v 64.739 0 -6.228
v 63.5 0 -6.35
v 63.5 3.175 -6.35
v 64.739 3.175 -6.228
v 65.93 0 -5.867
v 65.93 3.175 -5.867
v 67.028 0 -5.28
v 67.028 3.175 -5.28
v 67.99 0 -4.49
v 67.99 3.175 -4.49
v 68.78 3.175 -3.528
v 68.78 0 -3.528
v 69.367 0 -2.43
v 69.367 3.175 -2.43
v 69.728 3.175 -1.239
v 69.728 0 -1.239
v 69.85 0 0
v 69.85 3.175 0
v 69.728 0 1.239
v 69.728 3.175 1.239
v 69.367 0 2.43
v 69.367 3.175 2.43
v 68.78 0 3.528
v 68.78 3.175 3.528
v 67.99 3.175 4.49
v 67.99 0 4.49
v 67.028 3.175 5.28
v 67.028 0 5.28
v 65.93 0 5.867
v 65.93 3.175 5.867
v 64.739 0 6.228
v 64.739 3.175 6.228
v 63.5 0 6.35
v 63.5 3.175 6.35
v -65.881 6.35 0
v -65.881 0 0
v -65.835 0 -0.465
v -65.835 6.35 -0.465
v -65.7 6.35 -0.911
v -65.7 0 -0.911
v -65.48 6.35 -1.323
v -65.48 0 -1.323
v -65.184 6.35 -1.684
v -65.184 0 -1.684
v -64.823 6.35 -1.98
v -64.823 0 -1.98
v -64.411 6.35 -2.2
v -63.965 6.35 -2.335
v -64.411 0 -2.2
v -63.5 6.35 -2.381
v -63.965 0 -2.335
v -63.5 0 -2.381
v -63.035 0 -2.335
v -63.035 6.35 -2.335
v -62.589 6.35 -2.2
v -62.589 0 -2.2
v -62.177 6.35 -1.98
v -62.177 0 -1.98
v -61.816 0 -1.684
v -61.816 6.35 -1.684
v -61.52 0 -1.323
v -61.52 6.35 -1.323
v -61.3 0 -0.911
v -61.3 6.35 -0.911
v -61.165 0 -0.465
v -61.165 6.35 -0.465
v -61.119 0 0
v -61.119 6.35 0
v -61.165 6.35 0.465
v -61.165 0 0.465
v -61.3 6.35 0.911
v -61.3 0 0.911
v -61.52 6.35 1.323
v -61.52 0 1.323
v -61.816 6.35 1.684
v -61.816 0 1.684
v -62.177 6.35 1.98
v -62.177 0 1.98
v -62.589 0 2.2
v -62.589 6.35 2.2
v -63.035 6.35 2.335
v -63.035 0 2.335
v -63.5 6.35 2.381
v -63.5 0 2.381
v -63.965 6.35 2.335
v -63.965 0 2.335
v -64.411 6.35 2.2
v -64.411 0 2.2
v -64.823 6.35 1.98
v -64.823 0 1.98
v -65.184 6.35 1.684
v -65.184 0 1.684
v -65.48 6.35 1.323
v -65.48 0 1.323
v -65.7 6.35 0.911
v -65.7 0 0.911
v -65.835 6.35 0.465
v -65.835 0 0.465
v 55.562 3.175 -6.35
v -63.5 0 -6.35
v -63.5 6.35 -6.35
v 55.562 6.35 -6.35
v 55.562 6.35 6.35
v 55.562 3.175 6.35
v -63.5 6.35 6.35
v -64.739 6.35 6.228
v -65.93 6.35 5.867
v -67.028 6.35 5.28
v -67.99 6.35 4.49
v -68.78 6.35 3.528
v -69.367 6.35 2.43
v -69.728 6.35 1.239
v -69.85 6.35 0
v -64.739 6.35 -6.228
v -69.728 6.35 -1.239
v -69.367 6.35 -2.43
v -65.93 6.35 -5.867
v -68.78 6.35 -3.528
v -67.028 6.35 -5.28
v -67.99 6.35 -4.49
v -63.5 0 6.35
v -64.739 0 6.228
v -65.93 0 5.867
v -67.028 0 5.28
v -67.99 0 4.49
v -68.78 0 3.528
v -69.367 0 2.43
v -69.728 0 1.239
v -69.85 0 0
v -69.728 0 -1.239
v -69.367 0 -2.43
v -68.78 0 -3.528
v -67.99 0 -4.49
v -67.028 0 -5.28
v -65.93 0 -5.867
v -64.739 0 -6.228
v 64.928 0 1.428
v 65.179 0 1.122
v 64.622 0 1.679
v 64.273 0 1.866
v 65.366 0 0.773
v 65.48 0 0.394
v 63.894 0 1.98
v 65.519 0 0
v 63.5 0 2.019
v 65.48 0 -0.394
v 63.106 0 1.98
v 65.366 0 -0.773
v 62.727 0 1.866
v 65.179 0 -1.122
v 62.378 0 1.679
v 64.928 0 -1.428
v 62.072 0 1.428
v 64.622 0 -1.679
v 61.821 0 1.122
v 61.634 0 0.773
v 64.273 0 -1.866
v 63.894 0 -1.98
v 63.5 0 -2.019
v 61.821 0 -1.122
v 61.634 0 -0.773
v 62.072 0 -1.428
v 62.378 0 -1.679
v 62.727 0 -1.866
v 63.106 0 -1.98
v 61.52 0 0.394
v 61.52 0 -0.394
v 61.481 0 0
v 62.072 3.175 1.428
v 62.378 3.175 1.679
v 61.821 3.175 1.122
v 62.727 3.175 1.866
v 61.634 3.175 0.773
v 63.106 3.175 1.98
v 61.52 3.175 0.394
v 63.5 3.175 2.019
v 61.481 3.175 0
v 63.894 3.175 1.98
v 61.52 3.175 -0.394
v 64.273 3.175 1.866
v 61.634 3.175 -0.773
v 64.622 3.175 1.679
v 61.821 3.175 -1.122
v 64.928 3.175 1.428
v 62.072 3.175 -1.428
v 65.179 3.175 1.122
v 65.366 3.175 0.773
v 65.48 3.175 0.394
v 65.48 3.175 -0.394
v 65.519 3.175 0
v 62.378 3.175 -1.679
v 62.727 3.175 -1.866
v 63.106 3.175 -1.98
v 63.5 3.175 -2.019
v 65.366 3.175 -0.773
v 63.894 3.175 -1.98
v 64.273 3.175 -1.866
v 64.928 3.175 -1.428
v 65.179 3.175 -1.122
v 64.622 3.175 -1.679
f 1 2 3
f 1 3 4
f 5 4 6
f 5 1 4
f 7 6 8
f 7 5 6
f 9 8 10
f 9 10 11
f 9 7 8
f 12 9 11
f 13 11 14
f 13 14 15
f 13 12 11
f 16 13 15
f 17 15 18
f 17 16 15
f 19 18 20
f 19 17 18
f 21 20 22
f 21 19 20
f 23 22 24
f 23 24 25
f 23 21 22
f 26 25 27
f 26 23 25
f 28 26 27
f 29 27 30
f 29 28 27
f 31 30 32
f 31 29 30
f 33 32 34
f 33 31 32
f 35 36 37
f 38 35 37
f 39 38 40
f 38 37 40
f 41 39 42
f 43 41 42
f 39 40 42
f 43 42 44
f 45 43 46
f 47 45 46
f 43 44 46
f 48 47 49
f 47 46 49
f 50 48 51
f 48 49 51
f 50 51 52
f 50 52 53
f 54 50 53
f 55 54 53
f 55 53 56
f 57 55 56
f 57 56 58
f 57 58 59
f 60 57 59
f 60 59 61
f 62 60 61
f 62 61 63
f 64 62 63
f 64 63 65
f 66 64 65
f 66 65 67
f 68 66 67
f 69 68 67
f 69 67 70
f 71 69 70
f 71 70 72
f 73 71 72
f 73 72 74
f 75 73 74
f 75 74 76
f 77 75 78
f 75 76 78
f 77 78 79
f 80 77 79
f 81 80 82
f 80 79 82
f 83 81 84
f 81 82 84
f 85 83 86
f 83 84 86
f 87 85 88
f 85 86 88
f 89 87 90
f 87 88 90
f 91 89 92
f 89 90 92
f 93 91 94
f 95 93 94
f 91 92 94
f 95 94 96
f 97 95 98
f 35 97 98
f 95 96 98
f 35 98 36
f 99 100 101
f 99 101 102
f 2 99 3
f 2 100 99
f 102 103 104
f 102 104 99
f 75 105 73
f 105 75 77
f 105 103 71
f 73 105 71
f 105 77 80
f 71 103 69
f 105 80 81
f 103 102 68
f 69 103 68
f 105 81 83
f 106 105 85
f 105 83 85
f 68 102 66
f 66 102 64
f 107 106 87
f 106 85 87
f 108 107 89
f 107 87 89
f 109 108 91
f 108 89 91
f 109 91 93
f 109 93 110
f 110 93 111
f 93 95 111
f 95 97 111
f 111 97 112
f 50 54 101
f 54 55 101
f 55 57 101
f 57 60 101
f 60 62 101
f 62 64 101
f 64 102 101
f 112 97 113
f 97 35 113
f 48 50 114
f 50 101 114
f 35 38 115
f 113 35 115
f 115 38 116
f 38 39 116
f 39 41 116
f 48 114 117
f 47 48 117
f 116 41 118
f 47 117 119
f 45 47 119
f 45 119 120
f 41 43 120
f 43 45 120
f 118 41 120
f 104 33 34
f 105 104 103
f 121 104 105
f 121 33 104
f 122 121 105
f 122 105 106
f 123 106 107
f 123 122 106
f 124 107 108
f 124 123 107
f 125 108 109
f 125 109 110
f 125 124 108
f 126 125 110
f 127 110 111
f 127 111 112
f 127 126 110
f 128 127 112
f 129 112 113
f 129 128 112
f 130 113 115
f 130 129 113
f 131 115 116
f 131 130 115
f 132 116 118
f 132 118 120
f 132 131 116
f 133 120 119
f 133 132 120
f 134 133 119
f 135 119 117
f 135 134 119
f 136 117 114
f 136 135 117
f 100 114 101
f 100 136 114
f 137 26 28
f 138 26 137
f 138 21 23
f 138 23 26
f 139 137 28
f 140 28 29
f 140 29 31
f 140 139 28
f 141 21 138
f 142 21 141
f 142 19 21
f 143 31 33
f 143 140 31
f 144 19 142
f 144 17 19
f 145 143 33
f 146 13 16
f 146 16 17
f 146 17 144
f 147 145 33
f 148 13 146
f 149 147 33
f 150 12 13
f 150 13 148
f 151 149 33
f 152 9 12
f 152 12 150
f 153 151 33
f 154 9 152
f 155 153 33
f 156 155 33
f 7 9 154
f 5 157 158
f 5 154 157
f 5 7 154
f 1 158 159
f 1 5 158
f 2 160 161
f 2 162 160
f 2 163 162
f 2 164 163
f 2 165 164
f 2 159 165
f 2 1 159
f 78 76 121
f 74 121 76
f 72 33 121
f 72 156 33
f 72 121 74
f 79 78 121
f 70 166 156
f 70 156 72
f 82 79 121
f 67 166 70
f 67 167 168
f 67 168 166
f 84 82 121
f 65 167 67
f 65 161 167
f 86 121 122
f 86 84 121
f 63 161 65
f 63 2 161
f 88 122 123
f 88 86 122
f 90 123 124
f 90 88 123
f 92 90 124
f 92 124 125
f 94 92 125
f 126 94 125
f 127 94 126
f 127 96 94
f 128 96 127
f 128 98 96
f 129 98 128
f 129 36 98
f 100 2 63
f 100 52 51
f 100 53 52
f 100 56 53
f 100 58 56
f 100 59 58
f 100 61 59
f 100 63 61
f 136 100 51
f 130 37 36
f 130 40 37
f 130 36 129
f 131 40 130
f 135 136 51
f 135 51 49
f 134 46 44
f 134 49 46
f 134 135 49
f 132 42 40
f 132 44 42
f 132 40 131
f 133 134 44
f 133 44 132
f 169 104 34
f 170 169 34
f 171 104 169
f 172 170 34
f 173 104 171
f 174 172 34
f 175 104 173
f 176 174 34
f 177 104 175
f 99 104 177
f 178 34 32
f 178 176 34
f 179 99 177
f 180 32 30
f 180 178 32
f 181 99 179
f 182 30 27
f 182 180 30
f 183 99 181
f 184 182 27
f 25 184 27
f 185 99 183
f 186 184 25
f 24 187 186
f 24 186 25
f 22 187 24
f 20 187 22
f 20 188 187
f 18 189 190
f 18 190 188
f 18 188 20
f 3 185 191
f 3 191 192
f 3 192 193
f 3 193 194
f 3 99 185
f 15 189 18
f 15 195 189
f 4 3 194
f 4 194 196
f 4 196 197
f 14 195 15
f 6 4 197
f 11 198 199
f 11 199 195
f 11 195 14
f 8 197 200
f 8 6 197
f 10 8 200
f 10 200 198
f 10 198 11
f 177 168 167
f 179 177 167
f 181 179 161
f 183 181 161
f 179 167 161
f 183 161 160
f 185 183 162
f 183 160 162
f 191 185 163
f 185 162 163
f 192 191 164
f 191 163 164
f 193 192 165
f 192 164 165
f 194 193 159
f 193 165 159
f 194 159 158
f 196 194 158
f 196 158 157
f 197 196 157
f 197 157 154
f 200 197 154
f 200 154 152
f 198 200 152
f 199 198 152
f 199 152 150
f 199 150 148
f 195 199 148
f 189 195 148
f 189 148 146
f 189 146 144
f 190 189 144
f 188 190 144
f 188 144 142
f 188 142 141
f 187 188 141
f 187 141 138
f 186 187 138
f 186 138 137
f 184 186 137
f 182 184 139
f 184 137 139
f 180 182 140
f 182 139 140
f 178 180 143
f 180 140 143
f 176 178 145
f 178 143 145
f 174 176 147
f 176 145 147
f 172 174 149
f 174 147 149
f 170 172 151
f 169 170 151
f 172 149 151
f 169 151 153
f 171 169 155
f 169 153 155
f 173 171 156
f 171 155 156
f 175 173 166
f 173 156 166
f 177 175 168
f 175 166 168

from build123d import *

# Parameters (mm, degrees)
BOSS_EXTRUDE1_DEPTH            = 6.35
F_3_16_0_1875_DIAMETER_HOLE1_D = 4.7625
F_21_0_159_DIAMETER_HOLE1_D    = 4.0386
SKETCH4_W                      = 15.875
SKETCH4_H                      = 12.7
CUT_EXTRUDE1_DEPTH             = 3.175


with BuildPart() as part:
    # Sketch1 → Boss-Extrude1 (new body)
    with BuildSketch(Plane(origin=(0, 0, 0), x_dir=(1, 0, 0), z_dir=(0, 1, 0))):
        with BuildLine():
            Line((-63.5, 6.35), (63.5, 6.35))
            ThreePointArc((63.5, 6.35), (69.85, 0), (63.5, -6.35))
            Line((63.5, -6.35), (-63.5, -6.35))
            ThreePointArc((-63.5, -6.35), (-69.85, 0), (-63.5, 6.35))
        make_face()
    extrude(amount=BOSS_EXTRUDE1_DEPTH)

    # 3/16 (0.1875) Diameter Hole1 (through all)
    with Locations(Plane(origin=(0, 6.35, 0), x_dir=(1, 0, 0), z_dir=(0, 1, 0))):
        with Locations((-63.5, 0)):
            Hole(F_3_16_0_1875_DIAMETER_HOLE1_D / 2)

    # #21 (0.159) Diameter Hole1 (through all)
    with Locations(Plane(origin=(0, 6.35, 0), x_dir=(1, 0, 0), z_dir=(0, 1, 0))):
        with Locations((63.5, 0)):
            Hole(F_21_0_159_DIAMETER_HOLE1_D / 2)

    # Sketch4 → Cut-Extrude1 (cut)
    with BuildSketch(Plane(origin=(0, 6.35, 0), x_dir=(1, 0, 0), z_dir=(0, 1, 0))):
        with Locations((63.5, 0)):
            Rectangle(SKETCH4_W, SKETCH4_H)
    extrude(amount=-CUT_EXTRUDE1_DEPTH, mode=Mode.SUBTRACT)


solid = part.part
